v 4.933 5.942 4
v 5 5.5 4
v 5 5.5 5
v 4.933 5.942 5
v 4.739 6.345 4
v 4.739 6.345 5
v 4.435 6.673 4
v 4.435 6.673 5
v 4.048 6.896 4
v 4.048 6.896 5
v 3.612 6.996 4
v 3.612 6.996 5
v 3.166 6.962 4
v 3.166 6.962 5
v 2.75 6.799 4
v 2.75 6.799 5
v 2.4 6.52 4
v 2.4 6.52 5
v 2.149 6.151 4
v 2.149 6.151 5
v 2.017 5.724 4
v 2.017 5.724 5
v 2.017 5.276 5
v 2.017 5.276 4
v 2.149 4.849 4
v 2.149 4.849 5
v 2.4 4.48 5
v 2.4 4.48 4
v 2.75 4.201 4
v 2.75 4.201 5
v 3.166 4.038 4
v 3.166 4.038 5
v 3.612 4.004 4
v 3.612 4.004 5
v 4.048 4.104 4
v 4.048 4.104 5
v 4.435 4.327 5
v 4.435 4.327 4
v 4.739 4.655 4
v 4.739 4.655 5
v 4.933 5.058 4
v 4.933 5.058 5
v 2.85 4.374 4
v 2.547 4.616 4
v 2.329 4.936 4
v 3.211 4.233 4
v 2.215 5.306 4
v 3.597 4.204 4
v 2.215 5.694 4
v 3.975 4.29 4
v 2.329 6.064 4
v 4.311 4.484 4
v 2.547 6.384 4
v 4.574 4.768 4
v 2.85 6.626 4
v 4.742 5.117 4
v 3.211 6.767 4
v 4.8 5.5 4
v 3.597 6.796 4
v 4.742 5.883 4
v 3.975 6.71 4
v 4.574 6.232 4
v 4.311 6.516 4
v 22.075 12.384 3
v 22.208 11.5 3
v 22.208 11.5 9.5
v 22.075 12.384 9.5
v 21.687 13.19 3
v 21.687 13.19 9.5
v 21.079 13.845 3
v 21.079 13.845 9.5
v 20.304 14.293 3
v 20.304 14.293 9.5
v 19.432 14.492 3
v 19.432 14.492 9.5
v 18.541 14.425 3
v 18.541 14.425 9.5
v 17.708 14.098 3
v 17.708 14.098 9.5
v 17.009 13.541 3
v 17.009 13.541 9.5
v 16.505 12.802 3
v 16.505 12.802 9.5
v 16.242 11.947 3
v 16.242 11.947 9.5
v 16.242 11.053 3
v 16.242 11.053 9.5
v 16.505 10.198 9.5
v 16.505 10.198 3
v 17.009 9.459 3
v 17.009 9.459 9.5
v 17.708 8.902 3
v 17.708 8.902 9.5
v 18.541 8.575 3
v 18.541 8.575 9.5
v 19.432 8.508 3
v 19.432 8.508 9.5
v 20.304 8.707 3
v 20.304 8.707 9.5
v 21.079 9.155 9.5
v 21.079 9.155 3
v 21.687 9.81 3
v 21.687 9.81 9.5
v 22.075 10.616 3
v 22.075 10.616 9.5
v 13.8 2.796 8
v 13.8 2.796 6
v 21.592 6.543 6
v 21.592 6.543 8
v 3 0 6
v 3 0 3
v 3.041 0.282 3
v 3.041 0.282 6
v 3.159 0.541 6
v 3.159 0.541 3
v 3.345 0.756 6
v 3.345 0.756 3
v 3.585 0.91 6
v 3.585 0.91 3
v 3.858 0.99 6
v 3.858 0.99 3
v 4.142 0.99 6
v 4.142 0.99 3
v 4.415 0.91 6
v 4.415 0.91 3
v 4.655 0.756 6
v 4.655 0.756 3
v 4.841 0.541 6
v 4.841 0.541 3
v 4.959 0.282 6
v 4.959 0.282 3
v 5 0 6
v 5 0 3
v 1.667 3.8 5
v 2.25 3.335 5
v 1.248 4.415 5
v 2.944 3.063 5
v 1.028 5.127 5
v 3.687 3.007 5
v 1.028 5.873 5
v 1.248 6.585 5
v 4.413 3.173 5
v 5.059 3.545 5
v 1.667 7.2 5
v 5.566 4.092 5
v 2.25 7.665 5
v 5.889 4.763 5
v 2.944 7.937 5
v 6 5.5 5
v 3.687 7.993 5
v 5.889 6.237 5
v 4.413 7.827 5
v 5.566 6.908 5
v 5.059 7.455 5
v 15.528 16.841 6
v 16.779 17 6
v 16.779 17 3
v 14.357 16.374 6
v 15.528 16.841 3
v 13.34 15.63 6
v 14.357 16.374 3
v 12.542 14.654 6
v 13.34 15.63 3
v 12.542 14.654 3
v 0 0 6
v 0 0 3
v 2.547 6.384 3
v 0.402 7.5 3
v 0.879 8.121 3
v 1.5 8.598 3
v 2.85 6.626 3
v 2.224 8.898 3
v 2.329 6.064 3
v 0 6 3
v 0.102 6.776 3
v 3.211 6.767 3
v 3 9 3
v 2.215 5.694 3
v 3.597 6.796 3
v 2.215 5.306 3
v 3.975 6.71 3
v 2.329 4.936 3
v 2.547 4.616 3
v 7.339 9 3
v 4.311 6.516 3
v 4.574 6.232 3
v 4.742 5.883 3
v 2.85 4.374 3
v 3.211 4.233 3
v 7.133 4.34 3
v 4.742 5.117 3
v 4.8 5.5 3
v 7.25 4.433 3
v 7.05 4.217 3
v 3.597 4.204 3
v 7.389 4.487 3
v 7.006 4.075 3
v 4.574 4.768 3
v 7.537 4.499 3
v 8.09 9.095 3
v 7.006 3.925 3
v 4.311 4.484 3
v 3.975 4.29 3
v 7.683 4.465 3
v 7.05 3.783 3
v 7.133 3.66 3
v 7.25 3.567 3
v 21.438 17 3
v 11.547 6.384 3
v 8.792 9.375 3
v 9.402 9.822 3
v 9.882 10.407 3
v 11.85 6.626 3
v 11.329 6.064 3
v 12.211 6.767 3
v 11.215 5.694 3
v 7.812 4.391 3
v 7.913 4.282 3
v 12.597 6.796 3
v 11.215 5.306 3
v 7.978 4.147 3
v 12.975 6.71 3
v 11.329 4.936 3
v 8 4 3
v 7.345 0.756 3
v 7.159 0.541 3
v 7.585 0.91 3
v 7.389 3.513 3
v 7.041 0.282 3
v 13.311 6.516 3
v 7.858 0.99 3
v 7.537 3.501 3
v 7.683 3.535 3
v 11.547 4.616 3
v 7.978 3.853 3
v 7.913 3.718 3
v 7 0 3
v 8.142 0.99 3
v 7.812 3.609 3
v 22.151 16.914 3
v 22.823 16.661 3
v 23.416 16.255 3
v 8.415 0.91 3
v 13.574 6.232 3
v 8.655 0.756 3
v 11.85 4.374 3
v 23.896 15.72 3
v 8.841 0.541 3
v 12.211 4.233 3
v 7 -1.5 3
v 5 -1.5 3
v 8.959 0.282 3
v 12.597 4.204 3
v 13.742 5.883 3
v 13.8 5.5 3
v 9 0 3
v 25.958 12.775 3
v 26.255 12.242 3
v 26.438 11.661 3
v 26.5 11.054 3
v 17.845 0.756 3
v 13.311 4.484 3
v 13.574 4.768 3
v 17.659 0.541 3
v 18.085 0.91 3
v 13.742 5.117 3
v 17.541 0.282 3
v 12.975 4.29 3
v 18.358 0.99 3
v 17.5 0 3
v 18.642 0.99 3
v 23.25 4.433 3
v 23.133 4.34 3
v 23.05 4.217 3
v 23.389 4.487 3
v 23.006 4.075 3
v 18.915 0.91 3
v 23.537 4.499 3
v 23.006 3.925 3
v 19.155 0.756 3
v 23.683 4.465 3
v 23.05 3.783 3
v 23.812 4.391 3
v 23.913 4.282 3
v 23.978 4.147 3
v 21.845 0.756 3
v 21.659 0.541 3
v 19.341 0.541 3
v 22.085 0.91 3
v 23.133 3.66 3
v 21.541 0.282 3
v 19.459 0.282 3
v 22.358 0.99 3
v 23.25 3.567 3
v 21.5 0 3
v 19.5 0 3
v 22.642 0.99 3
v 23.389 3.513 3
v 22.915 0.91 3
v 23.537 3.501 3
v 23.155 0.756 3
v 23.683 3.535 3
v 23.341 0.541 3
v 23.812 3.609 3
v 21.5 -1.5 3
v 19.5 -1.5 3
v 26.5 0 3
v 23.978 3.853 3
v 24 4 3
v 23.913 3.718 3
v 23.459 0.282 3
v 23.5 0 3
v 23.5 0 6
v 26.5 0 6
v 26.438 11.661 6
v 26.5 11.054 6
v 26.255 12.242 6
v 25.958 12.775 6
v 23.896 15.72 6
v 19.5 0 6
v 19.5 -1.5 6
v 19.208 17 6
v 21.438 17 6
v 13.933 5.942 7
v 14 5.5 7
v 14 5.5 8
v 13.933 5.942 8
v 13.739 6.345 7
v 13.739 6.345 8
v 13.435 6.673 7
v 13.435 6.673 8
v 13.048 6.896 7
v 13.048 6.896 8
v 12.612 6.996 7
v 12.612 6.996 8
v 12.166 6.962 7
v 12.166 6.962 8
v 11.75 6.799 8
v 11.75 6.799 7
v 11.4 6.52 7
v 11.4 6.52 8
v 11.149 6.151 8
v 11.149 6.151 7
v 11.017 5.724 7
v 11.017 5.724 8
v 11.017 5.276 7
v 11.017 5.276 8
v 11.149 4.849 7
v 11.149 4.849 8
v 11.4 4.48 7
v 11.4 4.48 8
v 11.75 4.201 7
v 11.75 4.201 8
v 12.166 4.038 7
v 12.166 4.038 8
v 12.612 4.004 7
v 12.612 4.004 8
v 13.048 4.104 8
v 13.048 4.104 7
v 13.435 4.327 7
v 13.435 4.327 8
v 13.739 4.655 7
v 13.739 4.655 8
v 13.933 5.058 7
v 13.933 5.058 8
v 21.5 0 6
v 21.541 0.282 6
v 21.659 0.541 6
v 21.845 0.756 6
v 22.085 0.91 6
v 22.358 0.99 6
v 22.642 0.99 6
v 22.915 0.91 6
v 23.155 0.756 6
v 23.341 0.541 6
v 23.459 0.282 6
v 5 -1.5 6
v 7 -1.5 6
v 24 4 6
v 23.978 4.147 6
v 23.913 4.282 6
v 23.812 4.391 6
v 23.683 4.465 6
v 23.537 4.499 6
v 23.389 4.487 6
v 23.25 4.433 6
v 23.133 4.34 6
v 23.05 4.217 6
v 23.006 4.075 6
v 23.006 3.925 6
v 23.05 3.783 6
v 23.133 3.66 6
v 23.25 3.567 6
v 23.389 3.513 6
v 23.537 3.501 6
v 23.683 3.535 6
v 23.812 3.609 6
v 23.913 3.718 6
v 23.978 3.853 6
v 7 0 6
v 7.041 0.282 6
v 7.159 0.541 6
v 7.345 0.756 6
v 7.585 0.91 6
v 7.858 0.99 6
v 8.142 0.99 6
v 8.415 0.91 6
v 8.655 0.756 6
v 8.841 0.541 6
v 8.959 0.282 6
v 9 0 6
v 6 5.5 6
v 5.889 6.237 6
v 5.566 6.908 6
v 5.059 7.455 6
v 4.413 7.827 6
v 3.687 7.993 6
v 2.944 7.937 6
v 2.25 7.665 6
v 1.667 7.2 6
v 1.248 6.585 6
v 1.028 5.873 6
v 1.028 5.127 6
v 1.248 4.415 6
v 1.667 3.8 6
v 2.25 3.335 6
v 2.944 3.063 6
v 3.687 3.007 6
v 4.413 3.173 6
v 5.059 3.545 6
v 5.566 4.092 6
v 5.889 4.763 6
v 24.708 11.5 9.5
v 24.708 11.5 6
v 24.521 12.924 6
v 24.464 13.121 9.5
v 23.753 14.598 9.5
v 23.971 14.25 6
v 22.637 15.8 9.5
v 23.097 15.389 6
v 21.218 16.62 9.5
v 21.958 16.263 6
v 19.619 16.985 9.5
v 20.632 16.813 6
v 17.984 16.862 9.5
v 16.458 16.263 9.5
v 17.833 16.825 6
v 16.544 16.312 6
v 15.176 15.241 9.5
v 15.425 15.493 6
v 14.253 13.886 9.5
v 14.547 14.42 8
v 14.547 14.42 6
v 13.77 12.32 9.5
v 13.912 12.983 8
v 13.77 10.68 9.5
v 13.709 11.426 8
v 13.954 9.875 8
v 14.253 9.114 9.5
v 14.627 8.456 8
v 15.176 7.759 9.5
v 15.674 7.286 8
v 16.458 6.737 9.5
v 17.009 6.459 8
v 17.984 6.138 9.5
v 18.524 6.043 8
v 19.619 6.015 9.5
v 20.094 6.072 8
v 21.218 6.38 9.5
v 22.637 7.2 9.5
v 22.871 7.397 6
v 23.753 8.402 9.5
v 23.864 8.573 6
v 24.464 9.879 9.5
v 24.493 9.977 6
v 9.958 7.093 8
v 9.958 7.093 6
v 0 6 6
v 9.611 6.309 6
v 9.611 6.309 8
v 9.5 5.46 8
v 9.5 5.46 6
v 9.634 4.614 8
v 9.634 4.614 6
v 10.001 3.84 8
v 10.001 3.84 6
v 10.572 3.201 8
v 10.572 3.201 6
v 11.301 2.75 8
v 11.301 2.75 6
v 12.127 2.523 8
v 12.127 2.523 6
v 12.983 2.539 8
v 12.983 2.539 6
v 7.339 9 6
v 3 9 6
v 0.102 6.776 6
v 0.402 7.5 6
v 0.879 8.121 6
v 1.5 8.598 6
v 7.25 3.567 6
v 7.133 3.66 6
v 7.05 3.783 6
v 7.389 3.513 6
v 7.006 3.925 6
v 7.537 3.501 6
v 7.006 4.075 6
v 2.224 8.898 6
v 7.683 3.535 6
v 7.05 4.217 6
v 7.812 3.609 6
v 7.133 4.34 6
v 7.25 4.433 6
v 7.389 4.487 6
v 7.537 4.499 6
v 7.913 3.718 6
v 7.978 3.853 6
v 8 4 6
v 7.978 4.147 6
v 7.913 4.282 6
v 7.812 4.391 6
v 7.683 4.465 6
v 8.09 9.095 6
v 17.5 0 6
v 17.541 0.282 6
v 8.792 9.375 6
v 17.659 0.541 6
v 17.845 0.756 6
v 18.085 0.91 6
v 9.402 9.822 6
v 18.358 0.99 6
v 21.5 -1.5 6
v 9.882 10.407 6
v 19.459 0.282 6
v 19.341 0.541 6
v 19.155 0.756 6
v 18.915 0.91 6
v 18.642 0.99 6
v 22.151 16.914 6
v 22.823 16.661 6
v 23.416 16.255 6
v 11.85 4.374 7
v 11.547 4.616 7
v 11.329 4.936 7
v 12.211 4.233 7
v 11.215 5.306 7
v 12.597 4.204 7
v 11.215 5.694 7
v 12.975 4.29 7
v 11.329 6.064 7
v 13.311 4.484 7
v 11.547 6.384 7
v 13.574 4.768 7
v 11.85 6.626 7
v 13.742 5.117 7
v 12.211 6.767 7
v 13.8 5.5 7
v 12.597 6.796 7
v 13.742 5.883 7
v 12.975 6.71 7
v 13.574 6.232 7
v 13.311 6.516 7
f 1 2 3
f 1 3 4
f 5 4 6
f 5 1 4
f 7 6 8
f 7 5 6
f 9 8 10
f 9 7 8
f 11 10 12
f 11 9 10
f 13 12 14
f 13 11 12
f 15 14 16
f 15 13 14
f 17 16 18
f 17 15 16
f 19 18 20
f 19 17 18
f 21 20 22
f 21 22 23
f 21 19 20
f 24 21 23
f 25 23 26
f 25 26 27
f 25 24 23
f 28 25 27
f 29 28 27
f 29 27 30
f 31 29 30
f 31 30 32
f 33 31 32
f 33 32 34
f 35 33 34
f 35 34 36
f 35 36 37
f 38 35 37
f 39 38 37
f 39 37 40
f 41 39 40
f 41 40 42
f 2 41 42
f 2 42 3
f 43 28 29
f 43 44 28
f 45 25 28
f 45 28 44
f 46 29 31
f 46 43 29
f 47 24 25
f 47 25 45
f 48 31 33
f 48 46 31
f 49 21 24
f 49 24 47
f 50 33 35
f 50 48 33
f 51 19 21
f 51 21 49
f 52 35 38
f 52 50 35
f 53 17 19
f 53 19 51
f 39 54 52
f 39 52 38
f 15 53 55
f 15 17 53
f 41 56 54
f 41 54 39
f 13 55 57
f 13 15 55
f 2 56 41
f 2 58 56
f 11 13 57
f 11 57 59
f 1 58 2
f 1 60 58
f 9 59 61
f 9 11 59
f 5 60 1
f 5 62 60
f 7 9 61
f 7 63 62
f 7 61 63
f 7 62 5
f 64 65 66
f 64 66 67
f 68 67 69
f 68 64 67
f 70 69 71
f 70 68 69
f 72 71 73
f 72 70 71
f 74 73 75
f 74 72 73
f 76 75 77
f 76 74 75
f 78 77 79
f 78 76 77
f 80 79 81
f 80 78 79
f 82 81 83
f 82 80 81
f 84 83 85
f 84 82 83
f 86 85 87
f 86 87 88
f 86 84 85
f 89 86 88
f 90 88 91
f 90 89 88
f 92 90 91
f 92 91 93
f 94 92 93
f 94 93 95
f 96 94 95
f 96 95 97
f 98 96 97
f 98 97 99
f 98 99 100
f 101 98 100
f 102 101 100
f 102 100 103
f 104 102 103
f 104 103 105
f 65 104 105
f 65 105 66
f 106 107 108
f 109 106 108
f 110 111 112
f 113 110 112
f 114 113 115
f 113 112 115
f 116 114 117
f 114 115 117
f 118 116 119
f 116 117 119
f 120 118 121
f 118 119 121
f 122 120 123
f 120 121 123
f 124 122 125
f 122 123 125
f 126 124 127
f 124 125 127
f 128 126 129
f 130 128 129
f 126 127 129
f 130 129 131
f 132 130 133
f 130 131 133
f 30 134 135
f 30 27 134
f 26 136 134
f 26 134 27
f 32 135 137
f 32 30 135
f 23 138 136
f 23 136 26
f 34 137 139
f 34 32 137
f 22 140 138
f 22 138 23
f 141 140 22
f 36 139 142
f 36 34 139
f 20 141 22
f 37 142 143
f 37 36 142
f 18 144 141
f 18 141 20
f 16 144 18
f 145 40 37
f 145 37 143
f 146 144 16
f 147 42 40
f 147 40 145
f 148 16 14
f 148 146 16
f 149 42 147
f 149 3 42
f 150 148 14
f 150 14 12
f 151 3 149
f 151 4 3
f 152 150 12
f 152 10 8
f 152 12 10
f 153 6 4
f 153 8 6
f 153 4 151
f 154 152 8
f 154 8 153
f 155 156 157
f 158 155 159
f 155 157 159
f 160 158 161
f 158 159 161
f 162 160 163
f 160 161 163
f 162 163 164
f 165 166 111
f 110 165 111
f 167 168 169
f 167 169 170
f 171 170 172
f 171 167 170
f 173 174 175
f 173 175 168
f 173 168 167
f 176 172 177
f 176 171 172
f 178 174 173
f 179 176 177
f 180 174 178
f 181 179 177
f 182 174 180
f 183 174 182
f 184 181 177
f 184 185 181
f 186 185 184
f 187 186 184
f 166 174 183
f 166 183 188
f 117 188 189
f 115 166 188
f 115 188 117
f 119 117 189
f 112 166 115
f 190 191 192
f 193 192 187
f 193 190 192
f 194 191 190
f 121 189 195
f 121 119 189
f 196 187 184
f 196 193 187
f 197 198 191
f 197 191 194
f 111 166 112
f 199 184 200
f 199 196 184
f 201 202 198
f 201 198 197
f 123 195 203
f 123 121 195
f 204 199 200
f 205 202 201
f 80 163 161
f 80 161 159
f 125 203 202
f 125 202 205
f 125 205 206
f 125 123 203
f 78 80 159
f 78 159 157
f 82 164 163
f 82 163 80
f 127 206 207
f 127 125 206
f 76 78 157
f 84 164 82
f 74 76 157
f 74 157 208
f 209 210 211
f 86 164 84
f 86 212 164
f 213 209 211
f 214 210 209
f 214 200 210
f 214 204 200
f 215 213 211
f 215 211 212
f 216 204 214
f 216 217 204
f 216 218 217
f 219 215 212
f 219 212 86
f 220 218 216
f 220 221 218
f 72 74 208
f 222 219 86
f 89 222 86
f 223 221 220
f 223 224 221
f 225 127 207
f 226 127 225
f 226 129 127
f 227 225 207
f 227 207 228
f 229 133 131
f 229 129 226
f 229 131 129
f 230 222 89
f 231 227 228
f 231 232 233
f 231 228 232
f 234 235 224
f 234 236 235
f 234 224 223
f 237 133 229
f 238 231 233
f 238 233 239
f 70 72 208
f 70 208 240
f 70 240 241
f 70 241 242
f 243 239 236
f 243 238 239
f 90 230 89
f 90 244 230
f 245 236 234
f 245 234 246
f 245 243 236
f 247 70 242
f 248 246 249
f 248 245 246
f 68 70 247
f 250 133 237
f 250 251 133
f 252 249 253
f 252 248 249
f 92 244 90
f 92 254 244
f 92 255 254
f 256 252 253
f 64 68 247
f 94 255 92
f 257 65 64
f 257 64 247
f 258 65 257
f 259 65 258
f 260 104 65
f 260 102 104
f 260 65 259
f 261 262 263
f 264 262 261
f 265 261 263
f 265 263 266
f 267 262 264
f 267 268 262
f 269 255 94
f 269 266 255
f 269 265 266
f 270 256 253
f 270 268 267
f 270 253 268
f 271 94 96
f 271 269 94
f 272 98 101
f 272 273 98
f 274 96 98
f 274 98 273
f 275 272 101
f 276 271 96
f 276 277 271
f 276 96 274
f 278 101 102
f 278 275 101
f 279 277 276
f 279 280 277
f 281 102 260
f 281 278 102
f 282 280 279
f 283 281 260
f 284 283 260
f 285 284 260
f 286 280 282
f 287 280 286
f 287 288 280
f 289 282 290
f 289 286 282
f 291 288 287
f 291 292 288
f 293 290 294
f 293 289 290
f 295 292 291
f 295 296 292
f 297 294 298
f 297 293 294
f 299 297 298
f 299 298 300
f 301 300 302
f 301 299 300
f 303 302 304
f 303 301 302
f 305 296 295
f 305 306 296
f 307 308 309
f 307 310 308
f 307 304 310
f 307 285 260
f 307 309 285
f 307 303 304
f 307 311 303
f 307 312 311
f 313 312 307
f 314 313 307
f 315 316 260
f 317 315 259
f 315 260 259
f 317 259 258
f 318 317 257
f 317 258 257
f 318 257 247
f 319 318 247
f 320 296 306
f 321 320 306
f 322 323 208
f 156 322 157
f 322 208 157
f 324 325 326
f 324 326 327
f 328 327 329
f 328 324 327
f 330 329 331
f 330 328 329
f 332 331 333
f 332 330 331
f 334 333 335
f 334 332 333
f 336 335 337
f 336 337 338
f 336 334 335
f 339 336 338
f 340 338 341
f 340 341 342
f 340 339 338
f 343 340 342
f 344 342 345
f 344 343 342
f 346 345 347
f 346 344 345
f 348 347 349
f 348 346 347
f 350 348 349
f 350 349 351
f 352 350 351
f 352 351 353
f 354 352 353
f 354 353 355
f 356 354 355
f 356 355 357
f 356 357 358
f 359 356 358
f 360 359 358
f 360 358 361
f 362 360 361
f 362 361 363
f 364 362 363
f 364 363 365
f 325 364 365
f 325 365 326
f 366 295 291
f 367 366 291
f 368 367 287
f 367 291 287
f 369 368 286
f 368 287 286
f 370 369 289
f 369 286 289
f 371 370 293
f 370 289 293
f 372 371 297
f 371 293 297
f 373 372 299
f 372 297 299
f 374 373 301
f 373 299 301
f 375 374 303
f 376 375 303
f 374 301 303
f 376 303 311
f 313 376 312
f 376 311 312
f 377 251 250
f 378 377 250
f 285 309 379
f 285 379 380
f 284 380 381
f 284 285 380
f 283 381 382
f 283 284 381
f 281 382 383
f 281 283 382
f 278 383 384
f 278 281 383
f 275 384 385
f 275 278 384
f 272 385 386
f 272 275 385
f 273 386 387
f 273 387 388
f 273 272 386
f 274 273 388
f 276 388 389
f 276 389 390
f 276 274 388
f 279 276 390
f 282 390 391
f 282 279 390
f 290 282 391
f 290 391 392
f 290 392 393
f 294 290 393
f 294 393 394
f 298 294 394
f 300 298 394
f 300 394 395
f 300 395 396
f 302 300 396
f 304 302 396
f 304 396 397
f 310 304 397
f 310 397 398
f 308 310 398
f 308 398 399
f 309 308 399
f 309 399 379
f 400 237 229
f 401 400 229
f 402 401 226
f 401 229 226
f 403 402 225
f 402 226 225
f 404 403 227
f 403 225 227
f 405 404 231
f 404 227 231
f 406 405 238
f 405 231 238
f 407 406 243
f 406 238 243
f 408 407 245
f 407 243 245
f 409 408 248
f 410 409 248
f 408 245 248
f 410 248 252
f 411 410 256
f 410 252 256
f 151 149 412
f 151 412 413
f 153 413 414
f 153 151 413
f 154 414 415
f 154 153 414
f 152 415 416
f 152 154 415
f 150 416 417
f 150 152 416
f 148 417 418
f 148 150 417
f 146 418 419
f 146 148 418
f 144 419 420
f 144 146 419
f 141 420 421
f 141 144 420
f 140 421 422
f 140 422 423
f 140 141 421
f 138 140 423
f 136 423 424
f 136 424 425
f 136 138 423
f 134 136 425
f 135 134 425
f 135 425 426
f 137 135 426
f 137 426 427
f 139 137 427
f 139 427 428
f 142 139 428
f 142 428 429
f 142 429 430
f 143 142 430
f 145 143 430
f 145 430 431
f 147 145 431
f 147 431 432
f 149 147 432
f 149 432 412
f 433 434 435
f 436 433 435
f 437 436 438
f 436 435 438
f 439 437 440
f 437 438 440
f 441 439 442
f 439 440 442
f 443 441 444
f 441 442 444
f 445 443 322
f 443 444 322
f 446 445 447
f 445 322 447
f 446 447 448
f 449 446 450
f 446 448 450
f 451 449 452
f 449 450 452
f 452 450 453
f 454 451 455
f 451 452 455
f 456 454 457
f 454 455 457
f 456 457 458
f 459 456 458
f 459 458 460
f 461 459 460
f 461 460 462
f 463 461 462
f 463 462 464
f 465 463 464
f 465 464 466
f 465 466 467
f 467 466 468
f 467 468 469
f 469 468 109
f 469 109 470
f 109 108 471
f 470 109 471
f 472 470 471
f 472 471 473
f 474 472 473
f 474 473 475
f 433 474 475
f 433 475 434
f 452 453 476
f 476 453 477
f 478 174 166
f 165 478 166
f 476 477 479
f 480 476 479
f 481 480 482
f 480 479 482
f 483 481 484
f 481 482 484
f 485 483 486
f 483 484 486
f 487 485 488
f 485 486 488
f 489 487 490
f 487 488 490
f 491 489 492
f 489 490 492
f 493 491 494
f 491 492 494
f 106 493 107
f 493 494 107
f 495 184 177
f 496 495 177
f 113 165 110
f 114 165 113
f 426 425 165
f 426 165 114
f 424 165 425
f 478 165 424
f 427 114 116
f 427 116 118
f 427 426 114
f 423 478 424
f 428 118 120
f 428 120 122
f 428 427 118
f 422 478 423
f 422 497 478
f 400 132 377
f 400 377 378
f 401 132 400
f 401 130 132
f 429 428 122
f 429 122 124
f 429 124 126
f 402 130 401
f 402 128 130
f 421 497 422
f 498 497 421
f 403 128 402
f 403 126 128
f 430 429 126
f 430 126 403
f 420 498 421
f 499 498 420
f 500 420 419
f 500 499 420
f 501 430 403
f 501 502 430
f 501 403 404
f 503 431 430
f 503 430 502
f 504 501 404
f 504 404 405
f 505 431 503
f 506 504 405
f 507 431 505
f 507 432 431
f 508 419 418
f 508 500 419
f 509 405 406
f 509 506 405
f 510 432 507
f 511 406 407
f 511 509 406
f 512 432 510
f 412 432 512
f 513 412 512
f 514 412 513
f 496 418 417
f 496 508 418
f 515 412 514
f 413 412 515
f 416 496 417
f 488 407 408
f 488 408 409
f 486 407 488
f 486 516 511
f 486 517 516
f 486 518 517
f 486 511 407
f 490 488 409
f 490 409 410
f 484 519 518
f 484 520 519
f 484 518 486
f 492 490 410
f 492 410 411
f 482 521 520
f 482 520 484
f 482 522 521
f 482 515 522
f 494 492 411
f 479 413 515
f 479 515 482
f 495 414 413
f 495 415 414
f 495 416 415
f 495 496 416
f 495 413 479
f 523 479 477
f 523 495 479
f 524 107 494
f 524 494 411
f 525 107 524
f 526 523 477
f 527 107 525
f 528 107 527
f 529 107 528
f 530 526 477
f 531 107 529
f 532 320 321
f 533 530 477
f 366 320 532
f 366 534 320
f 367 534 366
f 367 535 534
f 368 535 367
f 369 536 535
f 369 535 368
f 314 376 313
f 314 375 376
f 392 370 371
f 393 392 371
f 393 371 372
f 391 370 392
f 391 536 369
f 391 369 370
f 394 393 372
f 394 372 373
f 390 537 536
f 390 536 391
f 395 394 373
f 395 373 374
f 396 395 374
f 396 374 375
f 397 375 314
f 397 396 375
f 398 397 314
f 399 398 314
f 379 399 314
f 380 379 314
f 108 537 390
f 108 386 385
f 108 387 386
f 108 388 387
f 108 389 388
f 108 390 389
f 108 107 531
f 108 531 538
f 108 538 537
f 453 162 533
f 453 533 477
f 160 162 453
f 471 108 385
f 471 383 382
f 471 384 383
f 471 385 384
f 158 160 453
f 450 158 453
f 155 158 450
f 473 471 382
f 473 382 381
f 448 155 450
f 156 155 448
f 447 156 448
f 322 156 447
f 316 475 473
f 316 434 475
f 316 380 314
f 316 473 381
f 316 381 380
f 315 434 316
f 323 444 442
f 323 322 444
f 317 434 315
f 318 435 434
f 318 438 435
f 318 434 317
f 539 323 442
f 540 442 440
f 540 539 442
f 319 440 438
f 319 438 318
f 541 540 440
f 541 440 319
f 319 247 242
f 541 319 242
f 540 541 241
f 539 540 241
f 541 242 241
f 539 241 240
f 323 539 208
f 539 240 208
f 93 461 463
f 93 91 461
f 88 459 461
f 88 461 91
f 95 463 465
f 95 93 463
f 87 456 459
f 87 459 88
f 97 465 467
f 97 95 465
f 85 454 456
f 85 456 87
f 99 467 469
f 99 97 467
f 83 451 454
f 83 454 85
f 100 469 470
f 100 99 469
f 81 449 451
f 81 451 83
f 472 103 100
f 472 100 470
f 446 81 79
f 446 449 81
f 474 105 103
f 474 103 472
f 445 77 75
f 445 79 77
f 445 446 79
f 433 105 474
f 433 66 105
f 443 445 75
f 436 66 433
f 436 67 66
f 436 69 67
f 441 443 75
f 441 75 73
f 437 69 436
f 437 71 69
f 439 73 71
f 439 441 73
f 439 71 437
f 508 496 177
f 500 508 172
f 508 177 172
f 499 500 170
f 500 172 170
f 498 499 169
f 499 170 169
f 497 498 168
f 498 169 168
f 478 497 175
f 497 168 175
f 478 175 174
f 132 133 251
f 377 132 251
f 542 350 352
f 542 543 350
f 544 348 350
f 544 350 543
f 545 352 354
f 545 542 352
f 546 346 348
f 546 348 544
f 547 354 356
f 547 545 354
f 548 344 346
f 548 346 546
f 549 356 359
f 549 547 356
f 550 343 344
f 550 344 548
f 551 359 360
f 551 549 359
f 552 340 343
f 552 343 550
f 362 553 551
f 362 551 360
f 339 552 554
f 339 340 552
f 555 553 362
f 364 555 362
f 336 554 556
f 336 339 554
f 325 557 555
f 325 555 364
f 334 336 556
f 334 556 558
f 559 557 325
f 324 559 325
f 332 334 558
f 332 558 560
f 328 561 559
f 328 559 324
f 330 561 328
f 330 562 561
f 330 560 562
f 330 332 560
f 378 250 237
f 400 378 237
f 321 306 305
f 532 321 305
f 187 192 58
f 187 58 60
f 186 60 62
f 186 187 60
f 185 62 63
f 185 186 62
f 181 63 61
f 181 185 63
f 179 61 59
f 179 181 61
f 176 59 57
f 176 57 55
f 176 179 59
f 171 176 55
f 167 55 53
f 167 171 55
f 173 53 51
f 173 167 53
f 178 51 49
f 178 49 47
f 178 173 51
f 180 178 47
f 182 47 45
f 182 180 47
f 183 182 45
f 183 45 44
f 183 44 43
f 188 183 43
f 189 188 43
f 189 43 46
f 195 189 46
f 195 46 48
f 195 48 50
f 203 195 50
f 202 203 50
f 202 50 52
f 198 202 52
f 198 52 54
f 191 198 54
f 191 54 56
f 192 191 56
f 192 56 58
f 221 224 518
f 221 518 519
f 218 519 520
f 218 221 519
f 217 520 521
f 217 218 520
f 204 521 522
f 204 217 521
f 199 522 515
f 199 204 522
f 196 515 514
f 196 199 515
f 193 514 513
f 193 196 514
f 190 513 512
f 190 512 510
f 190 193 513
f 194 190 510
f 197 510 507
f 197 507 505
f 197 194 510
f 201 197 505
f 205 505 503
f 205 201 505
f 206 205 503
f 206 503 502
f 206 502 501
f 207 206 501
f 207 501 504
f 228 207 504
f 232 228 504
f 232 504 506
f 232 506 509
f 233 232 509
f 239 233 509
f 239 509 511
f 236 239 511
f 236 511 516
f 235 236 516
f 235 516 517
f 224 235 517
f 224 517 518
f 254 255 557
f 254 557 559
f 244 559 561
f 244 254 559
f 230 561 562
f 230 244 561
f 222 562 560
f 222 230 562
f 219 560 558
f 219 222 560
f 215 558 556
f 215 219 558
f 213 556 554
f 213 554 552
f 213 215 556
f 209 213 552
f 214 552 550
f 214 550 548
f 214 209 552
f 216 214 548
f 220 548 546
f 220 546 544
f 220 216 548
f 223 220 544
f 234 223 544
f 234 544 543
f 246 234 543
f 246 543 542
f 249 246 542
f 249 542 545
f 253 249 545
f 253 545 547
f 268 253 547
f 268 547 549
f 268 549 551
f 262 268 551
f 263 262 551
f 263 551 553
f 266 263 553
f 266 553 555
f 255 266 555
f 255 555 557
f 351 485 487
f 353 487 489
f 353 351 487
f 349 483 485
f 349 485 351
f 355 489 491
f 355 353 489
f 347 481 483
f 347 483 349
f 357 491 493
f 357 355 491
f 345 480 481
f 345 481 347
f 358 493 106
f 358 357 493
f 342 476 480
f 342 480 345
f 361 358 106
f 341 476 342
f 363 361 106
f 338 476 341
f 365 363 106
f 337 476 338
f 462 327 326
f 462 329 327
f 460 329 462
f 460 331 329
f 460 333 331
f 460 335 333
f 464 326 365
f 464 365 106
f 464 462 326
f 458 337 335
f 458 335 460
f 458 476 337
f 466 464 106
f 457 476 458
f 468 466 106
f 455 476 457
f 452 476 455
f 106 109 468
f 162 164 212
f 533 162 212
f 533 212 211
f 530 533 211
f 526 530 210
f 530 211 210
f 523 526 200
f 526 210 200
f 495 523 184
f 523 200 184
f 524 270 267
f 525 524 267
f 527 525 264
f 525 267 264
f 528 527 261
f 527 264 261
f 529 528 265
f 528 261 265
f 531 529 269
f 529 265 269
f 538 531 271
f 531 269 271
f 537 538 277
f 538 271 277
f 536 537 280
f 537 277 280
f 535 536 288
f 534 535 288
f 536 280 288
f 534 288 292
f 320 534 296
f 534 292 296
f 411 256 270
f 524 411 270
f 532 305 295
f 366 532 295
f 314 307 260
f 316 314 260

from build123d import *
from build123d.topology import SkipClean

# Parameters (mm, degrees)
SKETCH1_W                            = 26.5
SKETCH1_H                            = 6
BOSS_EXTRUDE1_DEPTH                  = 17
SKETCH2_R                            = 1.5
CUT_EXTRUDE1_DEPTH                   = 1
SKETCH3_R                            = 1.3
CUT_EXTRUDE2_DEPTH                   = 32.878676259
SKETCH4_R                            = 3
CUT_EXTRUDE3_DEPTH                   = 33.050741021
SKETCH5_R                            = 2.5
CUT_EXTRUDE4_DEPTH                   = 1.5
SKETCH6_R                            = 1.5
CUT_EXTRUDE8_DEPTH                   = 1
SKETCH7_R                            = 1.3
CUT_EXTRUDE9_DEPTH                   = 32.678068123
CUT_EXTRUDE10_START                  = -1
SKETCH8_R                            = 2.5
CUT_EXTRUDE10_DEPTH                  = 1
CUT_EXTRUDE11_START                  = -1
SKETCH9_R                            = 1.5
CUT_EXTRUDE11_DEPTH                  = 1
SKETCH10_R                           = 5.5
SKETCH10_R_2                         = 3
BOSS_EXTRUDE2_DEPTH                  = 3.5
SKETCH11_R                           = 3
SKETCH11_R_2                         = 1.3
BOSS_EXTRUDE4_DEPTH                  = 2
CUT_EXTRUDE12_START                  = -1
SKETCH12_R                           = 1.5
CUT_EXTRUDE12_DEPTH                  = 1
SKETCH17_W                           = 2
SKETCH17_H                           = 6
BOSS_EXTRUDE6_DEPTH                  = 1.5
SKETCH18_R                           = 1
CUT_EXTRUDE17_DEPTH                  = 33.050741021
CHAMFER2_SIZE                        = 5
CHAMFER2_SIZE2                       = 3.5
FILLET11_R                           = 3
BOSS_EXTRUDE7_DEPTH                  = 2
CUT_EXTRUDE19_DEPTH                  = 33.050741021
FILLET13_R                           = 5
FILLET14_R                           = 3
FILLET15_R                           = 3
SKIZZE1_R                            = 0.5
SCHNITT_LINEAR_AUSTRAGEN1_DEPTH      = 33.050741021
SPIEGELN1_OUTLINE_R                  = 3
SPIEGELN1_OUTLINE_R_2                = 2.5
SPIEGELN1_OUTLINE_R_3                = 0.5
SPIEGELN1_OUTLINE_R_4                = 1.5
SPIEGELN1_DEPTH                      = 6
SPIEGELN1_START                      = 6
SPIEGELN1_2_OUTLINE_R                = 5.5
SPIEGELN1_2_OUTLINE_R_2              = 3
SPIEGELN1_2_DEPTH                    = 3.5
SPIEGELN1_3_OUTLINE_R                = 1.5
SPIEGELN1_3_DEPTH                    = 2
SPIEGELN1_START_2                    = 1.5
SPIEGELN1_4_OUTLINE_R                = 1.5
SPIEGELN1_4_OUTLINE_R_2              = 1.3
SPIEGELN1_4_OUTLINE_R_3              = 2.5
SPIEGELN1_4_DEPTH                    = 3.5
SPIEGELN1_START_3                    = 1
SPIEGELN1_5_OUTLINE_R                = 1.5
SPIEGELN1_5_OUTLINE_R_2              = 1.3
SPIEGELN1_5_DEPTH                    = 6
SPIEGELN1_START_4                    = 2.5
SPIEGELN1_6_OUTLINE_R                = 1.5
SPIEGELN1_6_OUTLINE_R_2              = 1.3
SPIEGELN1_6_DEPTH                    = 1.5
SCHNITT_LINEAR_AUSTRAGEN2_DEPTH      = 31.409702399
SCHNITT_LINEAR_AUSTRAGEN2_DEPTH_BACK = 31.409702399
SKIZZE2_W                            = 26.5
SKIZZE2_H                            = 9.5
SCHNITT_LINEAR_AUSTRAGEN3_DEPTH      = 31.409702399
SCHNITT_LINEAR_AUSTRAGEN3_DEPTH_BACK = 31.409702399
SKIZZE3_W                            = 26.5
SKIZZE3_H                            = 3


# Read off the part's stored shape, not the designer's step: Spiegeln1
with BuildPart() as part:
    # Sketch1 → Boss-Extrude1 (new body)
    with BuildSketch(Plane(origin=(0, 0, 0), x_dir=(1, 0, 0), z_dir=(0, 1, 0))):
        with Locations((13.25, 3)):
            Rectangle(SKETCH1_W, SKETCH1_H)
    extrude(amount=BOSS_EXTRUDE1_DEPTH)

    # Sketch2 → Cut-Extrude1 (cut)
    with BuildSketch(Plane.XY):
        with Locations((12.5, 5.5)):
            Circle(SKETCH2_R)
    extrude(amount=-CUT_EXTRUDE1_DEPTH, mode=Mode.SUBTRACT)

    # Sketch3 → Cut-Extrude2 (cut, through all)
    with BuildSketch(Plane.XY.offset(-1)):
        with Locations((12.5, 5.5)):
            Circle(SKETCH3_R)
    extrude(amount=-CUT_EXTRUDE2_DEPTH, mode=Mode.SUBTRACT)

    # Sketch4 → Cut-Extrude3 (cut, through all)
    with BuildSketch(Plane.XY):
        with Locations((19.208203932, 11.5)):
            Circle(SKETCH4_R)
    extrude(amount=-CUT_EXTRUDE3_DEPTH, mode=Mode.SUBTRACT)

    # Sketch5 → Cut-Extrude4 (cut)
    with BuildSketch(Plane.XY):
        with Locations((3.5, 5.5)):
            Circle(SKETCH5_R)
    extrude(amount=-CUT_EXTRUDE4_DEPTH, mode=Mode.SUBTRACT)

    # Sketch6 → Cut-Extrude8 (cut)
    with BuildSketch(Plane.XY.offset(-1.5)):
        with Locations((3.5, 5.5)):
            Circle(SKETCH6_R)
    extrude(amount=-CUT_EXTRUDE8_DEPTH, mode=Mode.SUBTRACT)

    # Sketch7 → Cut-Extrude9 (cut, through all)
    with BuildSketch(Plane.XY.offset(-2.5)):
        with Locations((3.5, 5.5)):
            Circle(SKETCH7_R)
    extrude(amount=-CUT_EXTRUDE9_DEPTH, mode=Mode.SUBTRACT)

    # Sketch8 → Cut-Extrude10 (cut)
    with BuildSketch(Plane(origin=(0, 0, -6), x_dir=(-1, 0, 0), z_dir=(0, 0, -1)).offset(CUT_EXTRUDE10_START)):
        with Locations(Location((-3.5, 5.5, 0), (0, 0, 180))):
            Circle(SKETCH8_R)
    extrude(amount=CUT_EXTRUDE10_DEPTH, mode=Mode.SUBTRACT)

    # Sketch9 → Cut-Extrude11 (cut)
    with BuildSketch(Plane(origin=(0, 0, -5), x_dir=(-1, 0, 0), z_dir=(0, 0, -1)).offset(CUT_EXTRUDE11_START)):
        with Locations(Location((-3.5, 5.5, 0), (0, 0, 180))):
            Circle(SKETCH9_R)
    extrude(amount=CUT_EXTRUDE11_DEPTH, mode=Mode.SUBTRACT)

    # Sketch10 → Boss-Extrude2 (add)
    with BuildSketch(Plane(origin=(0, 0, -6), x_dir=(-1, 0, 0), z_dir=(0, 0, -1))):
        with Locations(Location((-19.208203932, 11.5, 0), (0, 0, 90))):
            Circle(SKETCH10_R)
        with Locations(Location((-19.208203932, 11.5, 0), (0, 0, 180))):
            Circle(SKETCH10_R_2, mode=Mode.SUBTRACT)
    extrude(amount=BOSS_EXTRUDE2_DEPTH)

    # Sketch11 → Boss-Extrude4 (add)
    with BuildSketch(Plane(origin=(0, 0, -6), x_dir=(-1, 0, 0), z_dir=(0, 0, -1))):
        with Locations(Location((-12.5, 5.5, 0), (0, 0, 180))):
            Circle(SKETCH11_R)
        with Locations(Location((-12.5, 5.5, 0), (0, 0, 180))):
            Circle(SKETCH11_R_2, mode=Mode.SUBTRACT)
    extrude(amount=BOSS_EXTRUDE4_DEPTH)

    # Sketch12 → Cut-Extrude12 (cut)
    with BuildSketch(Plane(origin=(0, 0, -8), x_dir=(-1, 0, 0), z_dir=(0, 0, -1)).offset(CUT_EXTRUDE12_START)):
        with Locations(Location((-12.5, 5.5, 0), (0, 0, 180))):
            Circle(SKETCH12_R)
    extrude(amount=CUT_EXTRUDE12_DEPTH, mode=Mode.SUBTRACT)

    # Sketch17 → Boss-Extrude6 (add)
    with BuildSketch(Plane.XZ):
        with Locations((6, -3)):
            Rectangle(SKETCH17_W, SKETCH17_H)
        with Locations((20.5, -3)):
            Rectangle(SKETCH17_W, SKETCH17_H)
    extrude(amount=BOSS_EXTRUDE6_DEPTH)

    # Sketch18 → Cut-Extrude17 (cut, through all)
    with BuildSketch(Plane(origin=(0, 0, -6), x_dir=(-1, 0, 0), z_dir=(0, 0, -1))):
        with Locations((-22.5, 0)):
            Circle(SKETCH18_R)
        with Locations((-18.5, 0)):
            Circle(SKETCH18_R)
        with Locations((-8, 0)):
            Circle(SKETCH18_R)
        with Locations((-4, 0)):
            Circle(SKETCH18_R)
    extrude(amount=-CUT_EXTRUDE17_DEPTH, mode=Mode.SUBTRACT)

    # Chamfer2
    chamfer2_edges = [part.edges().sort_by_distance(p)[0] for p in [
        (26.5, 17, -3),
    ]]
    chamfer2_side = [part.faces().sort_by_distance(p)[0] for p in [
        (26.5, 8.5, -3),
    ]]
    chamfer(chamfer2_edges, length=CHAMFER2_SIZE, length2=CHAMFER2_SIZE2, reference=chamfer2_side[0])

    # Fillet11
    fillet11_edges = [part.edges().sort_by_distance(p)[0] for p in [
        (23, 17, -3),
        (26.5, 12, -3),
    ]]
    fillet(fillet11_edges, radius=FILLET11_R)

    # Sketch19 → Boss-Extrude7 (add)
    with BuildSketch(Plane(origin=(0, 0, -6), x_dir=(-1, 0, 0), z_dir=(0, 0, -1))):
        with BuildLine():
            Line((-14.547099294, 14.419606745), (-9.957579288, 7.09251277))
            ThreePointArc((-9.957579288, 7.09251277), (-14.736067977, 7.5), (-13.800160725, 2.796376119))
            Line((-13.800160725, 2.796376119), (-21.591831928, 6.543356218))
            ThreePointArc((-21.591831928, 6.543356218), (-15.108745974, 7.833333333), (-14.547099294, 14.419606745))
        make_face()
    extrude(amount=BOSS_EXTRUDE7_DEPTH)

    # Sketch20 → Cut-Extrude19 (cut, through all)
    with BuildSketch(Plane(origin=(0, 0, -6), x_dir=(-1, 0, 0), z_dir=(0, 0, -1))):
        Polygon((0, 17), (-14.011012575, 17), (-9, 9), (0, 9), align=None)
    extrude(amount=-CUT_EXTRUDE19_DEPTH, mode=Mode.SUBTRACT)

    # Fillet13
    fillet13_edges = [part.edges().sort_by_distance(p)[0] for p in [
        (14.011012575, 17, -3),
    ]]
    fillet(fillet13_edges, radius=FILLET13_R)

    # Fillet14
    fillet14_edges = [part.edges().sort_by_distance(p)[0] for p in [
        (9, 9, -3),
    ]]
    fillet(fillet14_edges, radius=FILLET14_R)

    # Fillet15
    fillet15_edges = [part.edges().sort_by_distance(p)[0] for p in [
        (0, 9, -3),
    ]]
    fillet(fillet15_edges, radius=FILLET15_R)

    # Skizze1 → Schnitt-Linear austragen1 (cut, through all)
    with BuildSketch(Plane(origin=(0, 0, -6), x_dir=(-1, 0, 0), z_dir=(0, 0, -1))):
        with Locations((-23.5, 4)):
            Circle(SKIZZE1_R)
        with Locations((-7.5, 4)):
            Circle(SKIZZE1_R)
    extrude(amount=-SCHNITT_LINEAR_AUSTRAGEN1_DEPTH, mode=Mode.SUBTRACT)

    # Spiegeln1 outline → Spiegeln1 (add)
    with SkipClean():  # the faces are left unmerged after this step: merging them gives an invalid solid
        with BuildSketch(Plane.XY):
            with BuildLine():
                Line((21.438033315, 17), (16.779018718, 17))
                ThreePointArc((16.779018718, 17), (14.357339523, 16.374410803), (12.541650865, 14.65418795))
                Line((12.541650865, 14.65418795), (9.881617026, 10.40748723))
                ThreePointArc((9.881617026, 10.40748723), (8.792203831, 9.375353518), (7.339196314, 9))
                Line((7.339196314, 9), (3, 9))
                ThreePointArc((3, 9), (0.878679656, 8.121320344), (0, 6))
                Line((0, 6), (0, 0))
                Line((0, 0), (3, 0))
                ThreePointArc((3, 0), (4, 1), (5, 0))
                Line((5, 0), (5, -1.5))
                Line((5, -1.5), (7, -1.5))
                Line((7, -1.5), (7, 0))
                ThreePointArc((7, 0), (8, 1), (9, 0))
                Line((9, 0), (17.5, 0))
                ThreePointArc((17.5, 0), (18.5, 1), (19.5, 0))
                Line((19.5, 0), (19.5, -1.5))
                Line((19.5, -1.5), (21.5, -1.5))
                Line((21.5, -1.5), (21.5, 0))
                ThreePointArc((21.5, 0), (22.5, 1), (23.5, 0))
                Line((23.5, 0), (26.5, 0))
                Line((26.5, 0), (26.5, 11.054333308))
                ThreePointArc((26.5, 11.054333308), (26.361213666, 11.956251462), (25.957695762, 12.774720341))
                Line((25.957695762, 12.774720341), (23.895729077, 15.720387033))
                ThreePointArc((23.895729077, 15.720387033), (22.823464458, 16.660936029), (21.438033315, 17))
            make_face()
            with Locations((19.208203932, 11.5)):
                Circle(SPIEGELN1_OUTLINE_R, mode=Mode.SUBTRACT)
            with Locations((3.5, 5.5)):
                Circle(SPIEGELN1_OUTLINE_R_2, mode=Mode.SUBTRACT)
            with Locations((7.5, 4)):
                Circle(SPIEGELN1_OUTLINE_R_3, mode=Mode.SUBTRACT)
            with Locations((23.5, 4)):
                Circle(SPIEGELN1_OUTLINE_R_3, mode=Mode.SUBTRACT)
            with Locations((12.5, 5.5)):
                Circle(SPIEGELN1_OUTLINE_R_4, mode=Mode.SUBTRACT)
        extrude(amount=SPIEGELN1_DEPTH)

    # Spiegeln1 2 outline → Spiegeln1 2 (add)
    with SkipClean():  # the faces are left unmerged after this step: merging them gives an invalid solid
        with BuildSketch(Plane.XY.offset(SPIEGELN1_START)):
            with Locations((19.208203932, 11.5)):
                Circle(SPIEGELN1_2_OUTLINE_R)
            with Locations((19.208203932, 11.5)):
                Circle(SPIEGELN1_2_OUTLINE_R_2, mode=Mode.SUBTRACT)
        extrude(amount=SPIEGELN1_2_DEPTH)

    # Spiegeln1 3 outline → Spiegeln1 3 (add)
    with SkipClean():  # the faces are left unmerged after this step: merging them gives an invalid solid
        with BuildSketch(Plane.XY.offset(SPIEGELN1_START)):
            with BuildLine():
                ThreePointArc((21.591831928, 6.543356218), (15.108745973, 7.833333333), (14.547099293, 14.419606745))
                Line((14.547099293, 14.419606745), (9.957579288, 7.09251277))
                ThreePointArc((9.957579288, 7.09251277), (10.263932023, 3.5), (13.800160725, 2.796376119))
                Line((13.800160725, 2.796376119), (21.591831928, 6.543356218))
            make_face()
            with Locations((12.5, 5.5)):
                Circle(SPIEGELN1_3_OUTLINE_R, mode=Mode.SUBTRACT)
        extrude(amount=SPIEGELN1_3_DEPTH)

    # Spiegeln1 4 outline → Spiegeln1 4 (add)
    # profile 1 of 2: a face of its own
    with SkipClean():  # the faces are left unmerged after this step: merging them gives an invalid solid
        with BuildSketch(Plane.XY.offset(SPIEGELN1_START_2)):
            with Locations((12.5, 5.5)):
                Circle(SPIEGELN1_4_OUTLINE_R)
            with Locations((12.5, 5.5)):
                Circle(SPIEGELN1_4_OUTLINE_R_2, mode=Mode.SUBTRACT)
        # profile 2 of 2: a face of its own
        with BuildSketch(Plane.XY.offset(SPIEGELN1_START_2)):
            with Locations((3.5, 5.5)):
                Circle(SPIEGELN1_4_OUTLINE_R_3)
            with Locations((3.5, 5.5)):
                Circle(SPIEGELN1_4_OUTLINE_R, mode=Mode.SUBTRACT)
        extrude(amount=SPIEGELN1_4_DEPTH)

    # Spiegeln1 5 outline → Spiegeln1 5 (add)
    with SkipClean():  # the faces are left unmerged after this step: merging them gives an invalid solid
        with BuildSketch(Plane.XY.offset(SPIEGELN1_START_3)):
            with Locations((12.5, 5.5)):
                Circle(SPIEGELN1_5_OUTLINE_R)
            with Locations((12.5, 5.5)):
                Circle(SPIEGELN1_5_OUTLINE_R_2, mode=Mode.SUBTRACT)
        extrude(amount=SPIEGELN1_5_DEPTH)

    # Spiegeln1 6 outline → Spiegeln1 6 (add)
    with SkipClean():  # the faces are left unmerged after this step: merging them gives an invalid solid
        with BuildSketch(Plane.XY.offset(SPIEGELN1_START_4)):
            with Locations((3.5, 5.5)):
                Circle(SPIEGELN1_6_OUTLINE_R)
            with Locations((3.5, 5.5)):
                Circle(SPIEGELN1_6_OUTLINE_R_2, mode=Mode.SUBTRACT)
        extrude(amount=SPIEGELN1_6_DEPTH)

    # Skizze2 → Schnitt-Linear austragen2 (cut, two sides: drawn at the far end of the back side and taken through both)
    with BuildSketch(Plane(origin=(0, 5.5, 0), x_dir=(1, 0, 0), z_dir=(0, 1, 0)).offset(-SCHNITT_LINEAR_AUSTRAGEN2_DEPTH_BACK)):
        with Locations((13.25, 4.75)):
            Rectangle(SKIZZE2_W, SKIZZE2_H)
    extrude(amount=SCHNITT_LINEAR_AUSTRAGEN2_DEPTH + SCHNITT_LINEAR_AUSTRAGEN2_DEPTH_BACK, mode=Mode.SUBTRACT)

    # Skizze3 → Schnitt-Linear austragen3 (cut, two sides: drawn at the far end of the back side and taken through both)
    with BuildSketch(Plane(origin=(0, 5.5, 0), x_dir=(1, 0, 0), z_dir=(0, 1, 0)).offset(-SCHNITT_LINEAR_AUSTRAGEN3_DEPTH_BACK)):
        with Locations((13.25, -1.5)):
            Rectangle(SKIZZE3_W, SKIZZE3_H)
    extrude(amount=SCHNITT_LINEAR_AUSTRAGEN3_DEPTH + SCHNITT_LINEAR_AUSTRAGEN3_DEPTH_BACK, mode=Mode.SUBTRACT)


solid = part.part
